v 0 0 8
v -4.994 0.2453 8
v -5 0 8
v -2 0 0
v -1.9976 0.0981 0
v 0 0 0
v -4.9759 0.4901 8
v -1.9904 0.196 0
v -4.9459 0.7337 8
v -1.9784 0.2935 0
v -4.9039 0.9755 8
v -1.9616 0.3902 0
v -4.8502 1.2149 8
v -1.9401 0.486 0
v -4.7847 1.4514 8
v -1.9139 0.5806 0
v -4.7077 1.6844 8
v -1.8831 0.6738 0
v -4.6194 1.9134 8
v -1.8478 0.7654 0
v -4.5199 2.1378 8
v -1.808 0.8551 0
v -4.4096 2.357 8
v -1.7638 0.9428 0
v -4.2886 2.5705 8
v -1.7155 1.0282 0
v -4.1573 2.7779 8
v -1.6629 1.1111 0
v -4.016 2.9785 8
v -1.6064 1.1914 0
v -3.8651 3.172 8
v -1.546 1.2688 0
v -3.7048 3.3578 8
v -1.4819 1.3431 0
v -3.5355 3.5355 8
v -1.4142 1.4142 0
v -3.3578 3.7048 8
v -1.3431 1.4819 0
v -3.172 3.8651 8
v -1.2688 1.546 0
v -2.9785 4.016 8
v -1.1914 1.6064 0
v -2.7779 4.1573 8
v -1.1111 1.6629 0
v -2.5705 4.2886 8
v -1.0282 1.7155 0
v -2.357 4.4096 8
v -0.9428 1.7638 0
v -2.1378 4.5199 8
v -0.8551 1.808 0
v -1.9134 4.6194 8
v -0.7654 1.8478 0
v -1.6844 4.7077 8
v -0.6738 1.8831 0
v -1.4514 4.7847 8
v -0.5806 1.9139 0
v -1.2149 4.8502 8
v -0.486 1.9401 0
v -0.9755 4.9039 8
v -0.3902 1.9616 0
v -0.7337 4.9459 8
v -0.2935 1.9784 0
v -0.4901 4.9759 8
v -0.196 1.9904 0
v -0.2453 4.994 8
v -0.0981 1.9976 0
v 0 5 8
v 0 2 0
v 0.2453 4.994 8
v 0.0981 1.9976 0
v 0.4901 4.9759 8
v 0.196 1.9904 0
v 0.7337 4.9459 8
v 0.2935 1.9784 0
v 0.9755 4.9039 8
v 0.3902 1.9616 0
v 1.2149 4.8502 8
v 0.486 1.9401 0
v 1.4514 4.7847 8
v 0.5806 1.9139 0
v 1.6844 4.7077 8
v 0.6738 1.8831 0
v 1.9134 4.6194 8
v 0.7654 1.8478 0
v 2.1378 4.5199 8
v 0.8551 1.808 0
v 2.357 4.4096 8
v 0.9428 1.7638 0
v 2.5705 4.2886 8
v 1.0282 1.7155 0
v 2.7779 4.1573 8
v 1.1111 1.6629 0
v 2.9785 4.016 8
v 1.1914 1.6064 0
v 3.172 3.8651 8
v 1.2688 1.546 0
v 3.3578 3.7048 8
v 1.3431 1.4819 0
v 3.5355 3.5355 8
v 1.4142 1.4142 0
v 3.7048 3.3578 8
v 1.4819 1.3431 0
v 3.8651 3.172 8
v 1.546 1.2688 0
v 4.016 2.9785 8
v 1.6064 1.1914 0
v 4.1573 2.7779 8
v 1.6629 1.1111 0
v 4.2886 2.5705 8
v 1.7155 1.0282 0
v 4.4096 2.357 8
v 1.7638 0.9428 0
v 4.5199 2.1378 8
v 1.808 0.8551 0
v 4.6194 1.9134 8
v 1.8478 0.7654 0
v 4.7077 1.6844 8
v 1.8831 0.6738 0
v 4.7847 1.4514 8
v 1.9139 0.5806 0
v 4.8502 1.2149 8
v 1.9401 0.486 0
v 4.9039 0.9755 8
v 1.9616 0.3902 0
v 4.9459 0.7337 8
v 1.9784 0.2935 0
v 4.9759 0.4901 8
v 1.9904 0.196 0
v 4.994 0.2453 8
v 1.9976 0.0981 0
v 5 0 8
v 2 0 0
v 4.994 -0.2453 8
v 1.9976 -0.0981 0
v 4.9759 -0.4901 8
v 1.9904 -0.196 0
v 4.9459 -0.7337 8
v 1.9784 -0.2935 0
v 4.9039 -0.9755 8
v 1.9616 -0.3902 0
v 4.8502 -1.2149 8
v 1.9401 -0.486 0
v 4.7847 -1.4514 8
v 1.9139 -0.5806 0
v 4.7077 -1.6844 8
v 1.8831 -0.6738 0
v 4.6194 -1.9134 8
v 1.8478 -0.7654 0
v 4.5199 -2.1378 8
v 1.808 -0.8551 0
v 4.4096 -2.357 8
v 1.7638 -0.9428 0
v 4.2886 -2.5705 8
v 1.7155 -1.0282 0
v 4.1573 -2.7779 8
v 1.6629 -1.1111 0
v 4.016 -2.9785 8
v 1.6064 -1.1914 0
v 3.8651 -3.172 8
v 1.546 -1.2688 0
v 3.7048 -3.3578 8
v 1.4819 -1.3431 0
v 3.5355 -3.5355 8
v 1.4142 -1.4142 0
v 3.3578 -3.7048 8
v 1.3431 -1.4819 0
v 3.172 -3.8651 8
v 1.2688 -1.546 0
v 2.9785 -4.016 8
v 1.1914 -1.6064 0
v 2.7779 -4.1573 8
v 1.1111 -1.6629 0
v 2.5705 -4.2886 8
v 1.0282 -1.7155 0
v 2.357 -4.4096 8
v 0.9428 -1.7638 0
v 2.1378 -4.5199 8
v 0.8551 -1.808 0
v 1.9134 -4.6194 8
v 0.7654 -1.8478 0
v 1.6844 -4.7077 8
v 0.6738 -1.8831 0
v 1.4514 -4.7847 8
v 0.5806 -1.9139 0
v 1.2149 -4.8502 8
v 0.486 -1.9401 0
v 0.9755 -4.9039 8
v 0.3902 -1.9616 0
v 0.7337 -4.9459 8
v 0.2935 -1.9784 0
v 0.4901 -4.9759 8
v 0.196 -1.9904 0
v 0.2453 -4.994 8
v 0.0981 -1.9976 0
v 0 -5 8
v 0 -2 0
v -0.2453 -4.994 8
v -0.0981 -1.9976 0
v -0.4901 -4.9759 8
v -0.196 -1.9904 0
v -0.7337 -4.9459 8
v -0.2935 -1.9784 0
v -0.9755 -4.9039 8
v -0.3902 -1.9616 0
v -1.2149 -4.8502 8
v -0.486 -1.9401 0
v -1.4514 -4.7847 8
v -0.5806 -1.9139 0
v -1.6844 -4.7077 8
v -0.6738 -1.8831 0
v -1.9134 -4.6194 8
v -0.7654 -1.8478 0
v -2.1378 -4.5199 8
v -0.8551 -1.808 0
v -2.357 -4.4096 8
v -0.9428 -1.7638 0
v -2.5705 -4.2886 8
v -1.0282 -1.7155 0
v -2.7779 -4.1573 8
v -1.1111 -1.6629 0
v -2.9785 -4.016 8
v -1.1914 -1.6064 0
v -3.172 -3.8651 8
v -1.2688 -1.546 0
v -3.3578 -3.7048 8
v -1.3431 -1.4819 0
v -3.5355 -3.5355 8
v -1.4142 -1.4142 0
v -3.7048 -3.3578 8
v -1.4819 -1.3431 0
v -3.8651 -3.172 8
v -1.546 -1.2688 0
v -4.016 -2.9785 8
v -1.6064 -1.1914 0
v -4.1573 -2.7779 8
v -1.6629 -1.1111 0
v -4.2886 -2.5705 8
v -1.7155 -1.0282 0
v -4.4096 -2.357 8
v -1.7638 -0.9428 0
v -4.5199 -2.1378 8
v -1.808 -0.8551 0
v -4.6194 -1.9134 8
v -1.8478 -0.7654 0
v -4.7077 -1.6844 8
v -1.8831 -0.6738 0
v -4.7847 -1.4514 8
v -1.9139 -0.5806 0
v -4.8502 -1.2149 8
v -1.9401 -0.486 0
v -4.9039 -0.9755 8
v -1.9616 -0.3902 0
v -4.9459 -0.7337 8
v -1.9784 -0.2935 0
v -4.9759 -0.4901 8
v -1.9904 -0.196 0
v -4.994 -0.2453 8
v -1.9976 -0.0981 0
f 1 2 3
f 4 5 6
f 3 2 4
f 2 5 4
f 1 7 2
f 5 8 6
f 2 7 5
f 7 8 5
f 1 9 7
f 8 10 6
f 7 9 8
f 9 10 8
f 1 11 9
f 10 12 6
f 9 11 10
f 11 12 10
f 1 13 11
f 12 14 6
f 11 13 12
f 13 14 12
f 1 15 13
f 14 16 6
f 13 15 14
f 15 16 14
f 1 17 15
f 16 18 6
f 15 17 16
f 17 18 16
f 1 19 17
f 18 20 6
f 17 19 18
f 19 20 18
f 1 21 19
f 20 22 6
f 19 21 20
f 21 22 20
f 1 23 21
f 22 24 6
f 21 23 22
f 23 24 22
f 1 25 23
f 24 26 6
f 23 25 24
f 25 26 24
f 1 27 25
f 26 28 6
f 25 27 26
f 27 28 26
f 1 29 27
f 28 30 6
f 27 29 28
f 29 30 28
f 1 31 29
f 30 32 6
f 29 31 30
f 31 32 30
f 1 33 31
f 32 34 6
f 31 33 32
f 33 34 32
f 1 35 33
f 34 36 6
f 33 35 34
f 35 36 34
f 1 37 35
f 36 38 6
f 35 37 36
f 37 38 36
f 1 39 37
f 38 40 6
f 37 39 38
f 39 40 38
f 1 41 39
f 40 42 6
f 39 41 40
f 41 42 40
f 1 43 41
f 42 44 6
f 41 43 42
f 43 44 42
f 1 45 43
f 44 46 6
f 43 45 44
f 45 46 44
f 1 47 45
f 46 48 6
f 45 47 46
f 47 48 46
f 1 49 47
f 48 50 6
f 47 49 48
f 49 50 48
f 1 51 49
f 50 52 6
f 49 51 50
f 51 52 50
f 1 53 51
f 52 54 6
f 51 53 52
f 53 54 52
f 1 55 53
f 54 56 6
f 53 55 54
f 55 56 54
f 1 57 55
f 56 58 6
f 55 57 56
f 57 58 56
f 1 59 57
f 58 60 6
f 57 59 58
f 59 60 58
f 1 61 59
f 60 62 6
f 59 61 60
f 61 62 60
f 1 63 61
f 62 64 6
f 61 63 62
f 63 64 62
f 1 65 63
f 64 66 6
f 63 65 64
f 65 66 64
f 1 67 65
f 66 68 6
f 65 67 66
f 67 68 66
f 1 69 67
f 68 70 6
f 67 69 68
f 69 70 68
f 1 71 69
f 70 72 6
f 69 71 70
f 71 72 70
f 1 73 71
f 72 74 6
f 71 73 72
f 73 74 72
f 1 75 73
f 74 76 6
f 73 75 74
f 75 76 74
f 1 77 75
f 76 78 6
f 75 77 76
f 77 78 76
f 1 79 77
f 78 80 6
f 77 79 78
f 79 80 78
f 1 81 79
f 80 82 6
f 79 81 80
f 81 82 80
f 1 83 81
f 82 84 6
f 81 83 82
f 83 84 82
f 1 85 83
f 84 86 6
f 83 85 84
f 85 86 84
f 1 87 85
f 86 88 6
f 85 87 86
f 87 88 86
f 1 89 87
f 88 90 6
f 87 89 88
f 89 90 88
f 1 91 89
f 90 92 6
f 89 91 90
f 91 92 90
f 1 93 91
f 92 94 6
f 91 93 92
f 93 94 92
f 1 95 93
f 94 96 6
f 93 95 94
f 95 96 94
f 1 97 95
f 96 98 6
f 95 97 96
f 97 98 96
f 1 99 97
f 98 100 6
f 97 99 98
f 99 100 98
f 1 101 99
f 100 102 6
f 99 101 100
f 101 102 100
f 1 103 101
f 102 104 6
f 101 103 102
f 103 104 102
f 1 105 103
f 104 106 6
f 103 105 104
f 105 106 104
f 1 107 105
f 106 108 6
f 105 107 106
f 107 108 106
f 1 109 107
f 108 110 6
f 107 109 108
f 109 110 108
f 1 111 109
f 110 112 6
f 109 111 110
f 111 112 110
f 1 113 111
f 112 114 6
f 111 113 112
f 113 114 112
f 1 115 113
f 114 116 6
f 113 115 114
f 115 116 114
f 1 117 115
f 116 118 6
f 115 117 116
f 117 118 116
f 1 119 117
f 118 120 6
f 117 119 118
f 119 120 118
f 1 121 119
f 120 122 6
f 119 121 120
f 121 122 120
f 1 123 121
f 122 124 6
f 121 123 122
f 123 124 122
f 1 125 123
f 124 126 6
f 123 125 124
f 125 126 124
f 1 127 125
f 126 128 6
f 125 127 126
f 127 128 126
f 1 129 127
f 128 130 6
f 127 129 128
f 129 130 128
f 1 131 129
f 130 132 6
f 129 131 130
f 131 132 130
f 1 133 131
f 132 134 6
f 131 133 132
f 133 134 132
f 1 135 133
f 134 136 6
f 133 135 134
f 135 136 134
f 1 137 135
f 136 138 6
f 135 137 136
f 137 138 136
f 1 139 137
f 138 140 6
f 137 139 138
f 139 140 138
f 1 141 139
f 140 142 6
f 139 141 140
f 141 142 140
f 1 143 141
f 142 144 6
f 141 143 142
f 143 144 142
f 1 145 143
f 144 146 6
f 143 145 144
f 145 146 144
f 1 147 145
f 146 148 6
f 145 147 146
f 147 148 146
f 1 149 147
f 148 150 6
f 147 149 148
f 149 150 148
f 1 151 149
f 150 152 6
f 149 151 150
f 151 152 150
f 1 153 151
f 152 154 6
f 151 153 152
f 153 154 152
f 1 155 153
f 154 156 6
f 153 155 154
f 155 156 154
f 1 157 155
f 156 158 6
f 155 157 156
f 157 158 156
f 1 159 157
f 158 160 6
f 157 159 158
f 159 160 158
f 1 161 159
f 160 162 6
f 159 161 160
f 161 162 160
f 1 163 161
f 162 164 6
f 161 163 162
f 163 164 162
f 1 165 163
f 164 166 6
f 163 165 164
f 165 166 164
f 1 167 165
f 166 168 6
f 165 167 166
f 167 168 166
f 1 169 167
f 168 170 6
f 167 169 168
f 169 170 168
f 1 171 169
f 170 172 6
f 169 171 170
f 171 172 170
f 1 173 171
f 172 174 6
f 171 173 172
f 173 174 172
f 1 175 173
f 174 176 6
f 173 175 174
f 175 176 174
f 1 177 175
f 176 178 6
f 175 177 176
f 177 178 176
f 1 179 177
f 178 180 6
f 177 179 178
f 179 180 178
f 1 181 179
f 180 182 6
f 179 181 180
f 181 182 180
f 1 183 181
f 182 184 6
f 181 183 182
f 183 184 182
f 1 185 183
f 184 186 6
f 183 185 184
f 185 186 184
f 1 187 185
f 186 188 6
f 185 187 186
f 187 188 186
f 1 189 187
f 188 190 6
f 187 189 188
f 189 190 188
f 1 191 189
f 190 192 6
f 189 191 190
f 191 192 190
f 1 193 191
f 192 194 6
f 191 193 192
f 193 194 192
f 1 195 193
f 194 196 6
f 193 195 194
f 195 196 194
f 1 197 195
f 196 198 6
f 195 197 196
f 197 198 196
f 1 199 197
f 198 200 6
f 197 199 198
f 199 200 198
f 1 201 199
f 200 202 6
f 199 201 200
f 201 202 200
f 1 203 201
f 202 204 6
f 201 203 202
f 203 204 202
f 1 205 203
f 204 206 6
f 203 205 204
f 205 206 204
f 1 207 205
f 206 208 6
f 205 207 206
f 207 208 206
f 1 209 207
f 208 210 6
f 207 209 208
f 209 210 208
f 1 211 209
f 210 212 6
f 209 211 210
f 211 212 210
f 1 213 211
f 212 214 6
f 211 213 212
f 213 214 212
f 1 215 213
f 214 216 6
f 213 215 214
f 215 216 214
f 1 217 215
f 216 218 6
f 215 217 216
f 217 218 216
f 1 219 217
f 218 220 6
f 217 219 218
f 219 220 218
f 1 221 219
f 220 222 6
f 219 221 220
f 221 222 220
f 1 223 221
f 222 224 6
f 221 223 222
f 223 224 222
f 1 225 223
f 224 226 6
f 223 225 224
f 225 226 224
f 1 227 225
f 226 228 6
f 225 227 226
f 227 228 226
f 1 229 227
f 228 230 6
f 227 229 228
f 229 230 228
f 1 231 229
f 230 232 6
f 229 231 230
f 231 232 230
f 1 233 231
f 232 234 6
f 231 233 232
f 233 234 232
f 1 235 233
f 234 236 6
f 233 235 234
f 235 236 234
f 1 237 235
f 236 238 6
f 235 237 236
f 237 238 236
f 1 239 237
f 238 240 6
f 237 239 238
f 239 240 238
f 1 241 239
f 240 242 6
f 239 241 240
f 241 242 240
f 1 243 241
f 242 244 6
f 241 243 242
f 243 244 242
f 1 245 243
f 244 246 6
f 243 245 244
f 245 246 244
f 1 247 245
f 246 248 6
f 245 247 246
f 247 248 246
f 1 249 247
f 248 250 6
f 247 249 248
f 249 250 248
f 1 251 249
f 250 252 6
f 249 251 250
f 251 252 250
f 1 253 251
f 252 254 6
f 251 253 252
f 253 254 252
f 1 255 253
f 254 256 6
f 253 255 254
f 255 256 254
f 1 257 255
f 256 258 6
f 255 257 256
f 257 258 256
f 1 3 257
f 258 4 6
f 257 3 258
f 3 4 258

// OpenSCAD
// Auto-generated from tests/data/feature_fixtures_manifest.json
// fixture: revolve_inverted_cone
// fixture_type: revolve
// description: Frustum (r1=2, r2=5, h=8) revolved around Z; tip-heavy taper; Phase 2 cone upgrade.
$fn = 96;

profile = [
    [0.000000, 0.000000],
    [2.000000, 0.000000],
    [5.000000, 8.000000],
    [0.000000, 8.000000]
];

rotate_extrude($fn=128) polygon(points=profile);
